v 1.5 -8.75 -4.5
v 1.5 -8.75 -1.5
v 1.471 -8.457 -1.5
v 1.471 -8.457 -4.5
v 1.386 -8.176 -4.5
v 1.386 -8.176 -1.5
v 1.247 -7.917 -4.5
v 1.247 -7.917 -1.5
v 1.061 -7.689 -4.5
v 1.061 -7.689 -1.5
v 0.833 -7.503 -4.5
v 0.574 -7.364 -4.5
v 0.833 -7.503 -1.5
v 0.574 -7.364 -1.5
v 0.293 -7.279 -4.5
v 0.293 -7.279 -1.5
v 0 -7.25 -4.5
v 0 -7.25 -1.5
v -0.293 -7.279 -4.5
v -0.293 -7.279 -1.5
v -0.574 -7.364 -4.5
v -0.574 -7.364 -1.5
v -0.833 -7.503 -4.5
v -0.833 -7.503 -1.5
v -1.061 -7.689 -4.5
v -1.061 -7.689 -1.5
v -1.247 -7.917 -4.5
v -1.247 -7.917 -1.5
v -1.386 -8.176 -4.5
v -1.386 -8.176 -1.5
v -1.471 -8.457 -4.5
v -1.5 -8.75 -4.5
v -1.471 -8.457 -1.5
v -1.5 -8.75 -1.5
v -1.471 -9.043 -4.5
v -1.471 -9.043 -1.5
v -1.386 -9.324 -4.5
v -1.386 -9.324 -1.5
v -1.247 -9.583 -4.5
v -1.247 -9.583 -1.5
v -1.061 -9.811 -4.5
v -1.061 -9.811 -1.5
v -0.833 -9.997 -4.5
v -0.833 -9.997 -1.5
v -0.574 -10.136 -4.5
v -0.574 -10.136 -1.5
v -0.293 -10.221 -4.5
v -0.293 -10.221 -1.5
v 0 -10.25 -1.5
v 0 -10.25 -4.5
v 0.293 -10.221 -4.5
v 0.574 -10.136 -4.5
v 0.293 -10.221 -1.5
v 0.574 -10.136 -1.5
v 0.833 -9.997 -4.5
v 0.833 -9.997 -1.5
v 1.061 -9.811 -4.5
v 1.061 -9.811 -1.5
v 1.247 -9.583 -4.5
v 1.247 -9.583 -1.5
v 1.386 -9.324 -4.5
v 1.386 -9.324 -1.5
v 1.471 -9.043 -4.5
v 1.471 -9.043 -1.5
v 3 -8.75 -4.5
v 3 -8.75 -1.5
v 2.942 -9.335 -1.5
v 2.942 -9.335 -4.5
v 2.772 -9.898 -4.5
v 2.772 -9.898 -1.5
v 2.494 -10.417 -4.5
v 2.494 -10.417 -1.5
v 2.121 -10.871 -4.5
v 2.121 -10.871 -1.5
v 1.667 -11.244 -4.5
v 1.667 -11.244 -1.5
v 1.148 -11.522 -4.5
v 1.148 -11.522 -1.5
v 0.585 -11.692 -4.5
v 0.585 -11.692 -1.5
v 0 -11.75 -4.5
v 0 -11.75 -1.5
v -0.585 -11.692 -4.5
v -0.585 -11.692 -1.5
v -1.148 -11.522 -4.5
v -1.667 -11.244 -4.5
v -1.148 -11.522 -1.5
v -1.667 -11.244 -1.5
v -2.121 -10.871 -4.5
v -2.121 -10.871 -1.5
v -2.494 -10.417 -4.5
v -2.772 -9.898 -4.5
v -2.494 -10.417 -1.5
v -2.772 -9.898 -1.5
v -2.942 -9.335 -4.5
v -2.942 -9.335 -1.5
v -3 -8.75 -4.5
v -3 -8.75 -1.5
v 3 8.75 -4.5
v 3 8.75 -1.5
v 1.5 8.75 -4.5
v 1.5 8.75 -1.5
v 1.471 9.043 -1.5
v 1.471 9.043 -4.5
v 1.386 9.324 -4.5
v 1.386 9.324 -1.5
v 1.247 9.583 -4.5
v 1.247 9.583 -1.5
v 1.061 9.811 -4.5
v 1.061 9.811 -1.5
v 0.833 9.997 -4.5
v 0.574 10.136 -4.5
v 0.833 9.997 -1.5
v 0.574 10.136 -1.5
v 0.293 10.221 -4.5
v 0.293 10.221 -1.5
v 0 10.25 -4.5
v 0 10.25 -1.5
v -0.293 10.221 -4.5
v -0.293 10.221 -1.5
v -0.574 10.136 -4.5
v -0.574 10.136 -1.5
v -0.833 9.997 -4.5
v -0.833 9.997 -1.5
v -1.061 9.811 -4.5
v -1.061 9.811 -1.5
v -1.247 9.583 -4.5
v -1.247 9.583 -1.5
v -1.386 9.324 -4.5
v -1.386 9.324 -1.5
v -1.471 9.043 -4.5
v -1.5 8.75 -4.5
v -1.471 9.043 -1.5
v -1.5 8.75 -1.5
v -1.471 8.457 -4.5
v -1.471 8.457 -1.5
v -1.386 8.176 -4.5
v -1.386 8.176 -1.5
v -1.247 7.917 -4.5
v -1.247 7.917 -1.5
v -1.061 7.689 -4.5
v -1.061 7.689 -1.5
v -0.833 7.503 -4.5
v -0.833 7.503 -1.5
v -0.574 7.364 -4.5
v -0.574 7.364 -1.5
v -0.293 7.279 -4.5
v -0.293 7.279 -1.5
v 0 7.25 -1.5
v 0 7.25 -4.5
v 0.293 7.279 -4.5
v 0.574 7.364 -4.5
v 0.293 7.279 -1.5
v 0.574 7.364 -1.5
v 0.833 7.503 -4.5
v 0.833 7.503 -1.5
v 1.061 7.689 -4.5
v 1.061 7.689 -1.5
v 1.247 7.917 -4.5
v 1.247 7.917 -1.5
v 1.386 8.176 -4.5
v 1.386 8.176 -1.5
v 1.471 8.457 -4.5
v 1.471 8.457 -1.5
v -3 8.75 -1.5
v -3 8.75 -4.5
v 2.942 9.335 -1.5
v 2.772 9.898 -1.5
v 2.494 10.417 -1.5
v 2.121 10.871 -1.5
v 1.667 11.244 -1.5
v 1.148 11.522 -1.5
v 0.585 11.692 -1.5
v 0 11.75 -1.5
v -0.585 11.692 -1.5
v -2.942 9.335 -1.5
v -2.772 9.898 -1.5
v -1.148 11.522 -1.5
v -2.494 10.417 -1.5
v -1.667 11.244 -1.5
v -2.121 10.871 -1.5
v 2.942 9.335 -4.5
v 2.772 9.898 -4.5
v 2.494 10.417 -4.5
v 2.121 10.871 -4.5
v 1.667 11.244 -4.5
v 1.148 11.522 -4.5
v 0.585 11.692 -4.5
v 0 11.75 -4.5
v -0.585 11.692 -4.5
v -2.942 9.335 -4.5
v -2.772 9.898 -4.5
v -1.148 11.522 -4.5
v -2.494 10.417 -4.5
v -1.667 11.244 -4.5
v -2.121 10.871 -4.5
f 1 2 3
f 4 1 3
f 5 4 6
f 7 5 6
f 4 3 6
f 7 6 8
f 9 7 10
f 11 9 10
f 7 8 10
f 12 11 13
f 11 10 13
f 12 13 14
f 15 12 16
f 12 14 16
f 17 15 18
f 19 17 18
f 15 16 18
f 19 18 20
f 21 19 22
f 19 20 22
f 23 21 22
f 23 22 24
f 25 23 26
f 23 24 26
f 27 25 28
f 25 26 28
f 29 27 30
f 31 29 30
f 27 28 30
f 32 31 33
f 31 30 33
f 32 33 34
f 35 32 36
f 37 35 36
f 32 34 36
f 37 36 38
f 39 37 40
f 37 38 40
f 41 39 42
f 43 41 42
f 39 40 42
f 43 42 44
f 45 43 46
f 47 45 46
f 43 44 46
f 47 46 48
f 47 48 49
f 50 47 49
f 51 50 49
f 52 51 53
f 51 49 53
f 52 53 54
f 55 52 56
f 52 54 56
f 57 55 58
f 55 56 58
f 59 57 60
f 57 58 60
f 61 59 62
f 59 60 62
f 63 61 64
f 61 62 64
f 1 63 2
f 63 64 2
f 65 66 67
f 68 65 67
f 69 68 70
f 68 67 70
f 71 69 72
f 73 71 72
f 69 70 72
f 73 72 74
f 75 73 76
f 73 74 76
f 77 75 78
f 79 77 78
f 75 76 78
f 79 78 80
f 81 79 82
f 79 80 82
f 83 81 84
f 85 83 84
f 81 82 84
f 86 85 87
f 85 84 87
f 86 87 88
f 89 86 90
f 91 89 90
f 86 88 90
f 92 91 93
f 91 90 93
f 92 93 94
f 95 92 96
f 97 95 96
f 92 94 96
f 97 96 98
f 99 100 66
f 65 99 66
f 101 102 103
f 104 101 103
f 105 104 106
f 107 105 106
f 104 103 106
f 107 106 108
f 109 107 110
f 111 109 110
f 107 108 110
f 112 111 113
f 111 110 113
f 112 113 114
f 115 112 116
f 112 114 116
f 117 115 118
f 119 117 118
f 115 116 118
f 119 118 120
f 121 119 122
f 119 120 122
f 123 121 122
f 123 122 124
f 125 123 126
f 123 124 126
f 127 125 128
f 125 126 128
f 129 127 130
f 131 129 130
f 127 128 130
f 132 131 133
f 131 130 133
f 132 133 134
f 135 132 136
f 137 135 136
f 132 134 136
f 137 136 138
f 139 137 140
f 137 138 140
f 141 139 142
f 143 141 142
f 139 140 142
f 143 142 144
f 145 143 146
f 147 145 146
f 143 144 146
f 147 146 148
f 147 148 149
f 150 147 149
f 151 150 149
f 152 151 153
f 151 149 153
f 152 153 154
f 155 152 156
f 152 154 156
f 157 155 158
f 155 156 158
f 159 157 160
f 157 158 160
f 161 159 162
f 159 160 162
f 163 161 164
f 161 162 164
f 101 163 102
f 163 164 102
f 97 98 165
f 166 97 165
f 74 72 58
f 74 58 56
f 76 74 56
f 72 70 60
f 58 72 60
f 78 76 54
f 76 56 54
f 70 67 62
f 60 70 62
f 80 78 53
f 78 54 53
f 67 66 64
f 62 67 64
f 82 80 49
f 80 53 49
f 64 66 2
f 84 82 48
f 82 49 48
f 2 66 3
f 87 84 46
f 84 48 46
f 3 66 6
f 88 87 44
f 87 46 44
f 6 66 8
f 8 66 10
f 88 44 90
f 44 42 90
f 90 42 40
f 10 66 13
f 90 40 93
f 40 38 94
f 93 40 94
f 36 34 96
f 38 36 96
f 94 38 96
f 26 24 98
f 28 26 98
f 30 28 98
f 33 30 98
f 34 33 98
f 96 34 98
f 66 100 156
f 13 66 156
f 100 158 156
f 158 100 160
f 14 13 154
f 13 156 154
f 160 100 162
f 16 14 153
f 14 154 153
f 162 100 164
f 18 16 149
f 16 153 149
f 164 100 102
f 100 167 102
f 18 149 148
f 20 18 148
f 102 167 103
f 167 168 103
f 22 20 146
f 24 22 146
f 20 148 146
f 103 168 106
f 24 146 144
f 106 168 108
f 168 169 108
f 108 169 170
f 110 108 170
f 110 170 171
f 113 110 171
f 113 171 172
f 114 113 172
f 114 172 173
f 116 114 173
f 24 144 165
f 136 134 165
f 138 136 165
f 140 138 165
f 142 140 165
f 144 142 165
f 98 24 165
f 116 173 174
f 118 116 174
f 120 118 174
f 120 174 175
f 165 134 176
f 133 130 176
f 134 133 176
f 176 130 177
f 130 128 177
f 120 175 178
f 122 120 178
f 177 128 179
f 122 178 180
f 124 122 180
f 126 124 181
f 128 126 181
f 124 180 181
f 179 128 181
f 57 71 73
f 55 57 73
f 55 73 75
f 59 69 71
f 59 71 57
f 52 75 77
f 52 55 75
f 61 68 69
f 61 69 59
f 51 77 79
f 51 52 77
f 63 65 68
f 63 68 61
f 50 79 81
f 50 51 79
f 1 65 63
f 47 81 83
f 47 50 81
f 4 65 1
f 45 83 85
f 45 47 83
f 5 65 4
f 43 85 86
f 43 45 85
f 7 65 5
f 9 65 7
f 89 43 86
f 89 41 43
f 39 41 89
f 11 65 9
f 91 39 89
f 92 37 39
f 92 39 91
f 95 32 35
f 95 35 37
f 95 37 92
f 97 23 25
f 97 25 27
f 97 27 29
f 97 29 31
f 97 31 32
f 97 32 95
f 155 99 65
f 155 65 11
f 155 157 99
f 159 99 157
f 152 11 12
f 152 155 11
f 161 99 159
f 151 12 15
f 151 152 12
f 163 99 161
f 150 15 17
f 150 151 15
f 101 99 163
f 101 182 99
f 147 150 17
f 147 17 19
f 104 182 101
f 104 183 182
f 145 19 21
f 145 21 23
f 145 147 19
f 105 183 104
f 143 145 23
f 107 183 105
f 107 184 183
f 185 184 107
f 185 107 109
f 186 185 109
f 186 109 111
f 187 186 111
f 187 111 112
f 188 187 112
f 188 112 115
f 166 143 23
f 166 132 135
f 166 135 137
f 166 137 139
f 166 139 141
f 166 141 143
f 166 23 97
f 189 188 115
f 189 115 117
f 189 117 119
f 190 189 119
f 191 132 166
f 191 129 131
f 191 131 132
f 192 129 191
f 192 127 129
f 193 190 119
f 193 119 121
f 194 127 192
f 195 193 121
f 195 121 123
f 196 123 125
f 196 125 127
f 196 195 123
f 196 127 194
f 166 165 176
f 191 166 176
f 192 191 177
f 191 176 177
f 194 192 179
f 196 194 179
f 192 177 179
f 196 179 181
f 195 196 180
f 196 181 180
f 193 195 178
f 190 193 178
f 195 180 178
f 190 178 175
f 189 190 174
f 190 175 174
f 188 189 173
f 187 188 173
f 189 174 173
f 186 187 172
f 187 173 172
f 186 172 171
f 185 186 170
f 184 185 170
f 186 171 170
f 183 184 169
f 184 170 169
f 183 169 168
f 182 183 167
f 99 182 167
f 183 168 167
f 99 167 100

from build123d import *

# Parameters (mm, degrees)
SKETCH1_R           = 3
BOSS_EXTRUDE1_DEPTH = 6
SCALE1_SCALE        = 0.5


with BuildPart() as part:
    # Sketch1 → Boss-Extrude1 (new body)
    with BuildSketch(Plane.XY):
        with BuildLine():
            Line((6, 17.5), (6, -17.5))
            ThreePointArc((6, -17.5), (0, -23.5), (-6, -17.5))
            Line((-6, -17.5), (-6, 17.5))
            ThreePointArc((-6, 17.5), (0, 23.5), (6, 17.5))
        make_face()
        with Locations((0, 17.5)):
            Circle(SKETCH1_R, mode=Mode.SUBTRACT)
        with Locations((0, -17.5)):
            Circle(SKETCH1_R, mode=Mode.SUBTRACT)
    extrude(amount=-BOSS_EXTRUDE1_DEPTH)


with BuildPart() as part_1:
    # Scale1: scaled about (0, 0, -3)
    add(part.part.scale(SCALE1_SCALE).moved(Location((0, 0, -1.5))))


solid = part_1.part
